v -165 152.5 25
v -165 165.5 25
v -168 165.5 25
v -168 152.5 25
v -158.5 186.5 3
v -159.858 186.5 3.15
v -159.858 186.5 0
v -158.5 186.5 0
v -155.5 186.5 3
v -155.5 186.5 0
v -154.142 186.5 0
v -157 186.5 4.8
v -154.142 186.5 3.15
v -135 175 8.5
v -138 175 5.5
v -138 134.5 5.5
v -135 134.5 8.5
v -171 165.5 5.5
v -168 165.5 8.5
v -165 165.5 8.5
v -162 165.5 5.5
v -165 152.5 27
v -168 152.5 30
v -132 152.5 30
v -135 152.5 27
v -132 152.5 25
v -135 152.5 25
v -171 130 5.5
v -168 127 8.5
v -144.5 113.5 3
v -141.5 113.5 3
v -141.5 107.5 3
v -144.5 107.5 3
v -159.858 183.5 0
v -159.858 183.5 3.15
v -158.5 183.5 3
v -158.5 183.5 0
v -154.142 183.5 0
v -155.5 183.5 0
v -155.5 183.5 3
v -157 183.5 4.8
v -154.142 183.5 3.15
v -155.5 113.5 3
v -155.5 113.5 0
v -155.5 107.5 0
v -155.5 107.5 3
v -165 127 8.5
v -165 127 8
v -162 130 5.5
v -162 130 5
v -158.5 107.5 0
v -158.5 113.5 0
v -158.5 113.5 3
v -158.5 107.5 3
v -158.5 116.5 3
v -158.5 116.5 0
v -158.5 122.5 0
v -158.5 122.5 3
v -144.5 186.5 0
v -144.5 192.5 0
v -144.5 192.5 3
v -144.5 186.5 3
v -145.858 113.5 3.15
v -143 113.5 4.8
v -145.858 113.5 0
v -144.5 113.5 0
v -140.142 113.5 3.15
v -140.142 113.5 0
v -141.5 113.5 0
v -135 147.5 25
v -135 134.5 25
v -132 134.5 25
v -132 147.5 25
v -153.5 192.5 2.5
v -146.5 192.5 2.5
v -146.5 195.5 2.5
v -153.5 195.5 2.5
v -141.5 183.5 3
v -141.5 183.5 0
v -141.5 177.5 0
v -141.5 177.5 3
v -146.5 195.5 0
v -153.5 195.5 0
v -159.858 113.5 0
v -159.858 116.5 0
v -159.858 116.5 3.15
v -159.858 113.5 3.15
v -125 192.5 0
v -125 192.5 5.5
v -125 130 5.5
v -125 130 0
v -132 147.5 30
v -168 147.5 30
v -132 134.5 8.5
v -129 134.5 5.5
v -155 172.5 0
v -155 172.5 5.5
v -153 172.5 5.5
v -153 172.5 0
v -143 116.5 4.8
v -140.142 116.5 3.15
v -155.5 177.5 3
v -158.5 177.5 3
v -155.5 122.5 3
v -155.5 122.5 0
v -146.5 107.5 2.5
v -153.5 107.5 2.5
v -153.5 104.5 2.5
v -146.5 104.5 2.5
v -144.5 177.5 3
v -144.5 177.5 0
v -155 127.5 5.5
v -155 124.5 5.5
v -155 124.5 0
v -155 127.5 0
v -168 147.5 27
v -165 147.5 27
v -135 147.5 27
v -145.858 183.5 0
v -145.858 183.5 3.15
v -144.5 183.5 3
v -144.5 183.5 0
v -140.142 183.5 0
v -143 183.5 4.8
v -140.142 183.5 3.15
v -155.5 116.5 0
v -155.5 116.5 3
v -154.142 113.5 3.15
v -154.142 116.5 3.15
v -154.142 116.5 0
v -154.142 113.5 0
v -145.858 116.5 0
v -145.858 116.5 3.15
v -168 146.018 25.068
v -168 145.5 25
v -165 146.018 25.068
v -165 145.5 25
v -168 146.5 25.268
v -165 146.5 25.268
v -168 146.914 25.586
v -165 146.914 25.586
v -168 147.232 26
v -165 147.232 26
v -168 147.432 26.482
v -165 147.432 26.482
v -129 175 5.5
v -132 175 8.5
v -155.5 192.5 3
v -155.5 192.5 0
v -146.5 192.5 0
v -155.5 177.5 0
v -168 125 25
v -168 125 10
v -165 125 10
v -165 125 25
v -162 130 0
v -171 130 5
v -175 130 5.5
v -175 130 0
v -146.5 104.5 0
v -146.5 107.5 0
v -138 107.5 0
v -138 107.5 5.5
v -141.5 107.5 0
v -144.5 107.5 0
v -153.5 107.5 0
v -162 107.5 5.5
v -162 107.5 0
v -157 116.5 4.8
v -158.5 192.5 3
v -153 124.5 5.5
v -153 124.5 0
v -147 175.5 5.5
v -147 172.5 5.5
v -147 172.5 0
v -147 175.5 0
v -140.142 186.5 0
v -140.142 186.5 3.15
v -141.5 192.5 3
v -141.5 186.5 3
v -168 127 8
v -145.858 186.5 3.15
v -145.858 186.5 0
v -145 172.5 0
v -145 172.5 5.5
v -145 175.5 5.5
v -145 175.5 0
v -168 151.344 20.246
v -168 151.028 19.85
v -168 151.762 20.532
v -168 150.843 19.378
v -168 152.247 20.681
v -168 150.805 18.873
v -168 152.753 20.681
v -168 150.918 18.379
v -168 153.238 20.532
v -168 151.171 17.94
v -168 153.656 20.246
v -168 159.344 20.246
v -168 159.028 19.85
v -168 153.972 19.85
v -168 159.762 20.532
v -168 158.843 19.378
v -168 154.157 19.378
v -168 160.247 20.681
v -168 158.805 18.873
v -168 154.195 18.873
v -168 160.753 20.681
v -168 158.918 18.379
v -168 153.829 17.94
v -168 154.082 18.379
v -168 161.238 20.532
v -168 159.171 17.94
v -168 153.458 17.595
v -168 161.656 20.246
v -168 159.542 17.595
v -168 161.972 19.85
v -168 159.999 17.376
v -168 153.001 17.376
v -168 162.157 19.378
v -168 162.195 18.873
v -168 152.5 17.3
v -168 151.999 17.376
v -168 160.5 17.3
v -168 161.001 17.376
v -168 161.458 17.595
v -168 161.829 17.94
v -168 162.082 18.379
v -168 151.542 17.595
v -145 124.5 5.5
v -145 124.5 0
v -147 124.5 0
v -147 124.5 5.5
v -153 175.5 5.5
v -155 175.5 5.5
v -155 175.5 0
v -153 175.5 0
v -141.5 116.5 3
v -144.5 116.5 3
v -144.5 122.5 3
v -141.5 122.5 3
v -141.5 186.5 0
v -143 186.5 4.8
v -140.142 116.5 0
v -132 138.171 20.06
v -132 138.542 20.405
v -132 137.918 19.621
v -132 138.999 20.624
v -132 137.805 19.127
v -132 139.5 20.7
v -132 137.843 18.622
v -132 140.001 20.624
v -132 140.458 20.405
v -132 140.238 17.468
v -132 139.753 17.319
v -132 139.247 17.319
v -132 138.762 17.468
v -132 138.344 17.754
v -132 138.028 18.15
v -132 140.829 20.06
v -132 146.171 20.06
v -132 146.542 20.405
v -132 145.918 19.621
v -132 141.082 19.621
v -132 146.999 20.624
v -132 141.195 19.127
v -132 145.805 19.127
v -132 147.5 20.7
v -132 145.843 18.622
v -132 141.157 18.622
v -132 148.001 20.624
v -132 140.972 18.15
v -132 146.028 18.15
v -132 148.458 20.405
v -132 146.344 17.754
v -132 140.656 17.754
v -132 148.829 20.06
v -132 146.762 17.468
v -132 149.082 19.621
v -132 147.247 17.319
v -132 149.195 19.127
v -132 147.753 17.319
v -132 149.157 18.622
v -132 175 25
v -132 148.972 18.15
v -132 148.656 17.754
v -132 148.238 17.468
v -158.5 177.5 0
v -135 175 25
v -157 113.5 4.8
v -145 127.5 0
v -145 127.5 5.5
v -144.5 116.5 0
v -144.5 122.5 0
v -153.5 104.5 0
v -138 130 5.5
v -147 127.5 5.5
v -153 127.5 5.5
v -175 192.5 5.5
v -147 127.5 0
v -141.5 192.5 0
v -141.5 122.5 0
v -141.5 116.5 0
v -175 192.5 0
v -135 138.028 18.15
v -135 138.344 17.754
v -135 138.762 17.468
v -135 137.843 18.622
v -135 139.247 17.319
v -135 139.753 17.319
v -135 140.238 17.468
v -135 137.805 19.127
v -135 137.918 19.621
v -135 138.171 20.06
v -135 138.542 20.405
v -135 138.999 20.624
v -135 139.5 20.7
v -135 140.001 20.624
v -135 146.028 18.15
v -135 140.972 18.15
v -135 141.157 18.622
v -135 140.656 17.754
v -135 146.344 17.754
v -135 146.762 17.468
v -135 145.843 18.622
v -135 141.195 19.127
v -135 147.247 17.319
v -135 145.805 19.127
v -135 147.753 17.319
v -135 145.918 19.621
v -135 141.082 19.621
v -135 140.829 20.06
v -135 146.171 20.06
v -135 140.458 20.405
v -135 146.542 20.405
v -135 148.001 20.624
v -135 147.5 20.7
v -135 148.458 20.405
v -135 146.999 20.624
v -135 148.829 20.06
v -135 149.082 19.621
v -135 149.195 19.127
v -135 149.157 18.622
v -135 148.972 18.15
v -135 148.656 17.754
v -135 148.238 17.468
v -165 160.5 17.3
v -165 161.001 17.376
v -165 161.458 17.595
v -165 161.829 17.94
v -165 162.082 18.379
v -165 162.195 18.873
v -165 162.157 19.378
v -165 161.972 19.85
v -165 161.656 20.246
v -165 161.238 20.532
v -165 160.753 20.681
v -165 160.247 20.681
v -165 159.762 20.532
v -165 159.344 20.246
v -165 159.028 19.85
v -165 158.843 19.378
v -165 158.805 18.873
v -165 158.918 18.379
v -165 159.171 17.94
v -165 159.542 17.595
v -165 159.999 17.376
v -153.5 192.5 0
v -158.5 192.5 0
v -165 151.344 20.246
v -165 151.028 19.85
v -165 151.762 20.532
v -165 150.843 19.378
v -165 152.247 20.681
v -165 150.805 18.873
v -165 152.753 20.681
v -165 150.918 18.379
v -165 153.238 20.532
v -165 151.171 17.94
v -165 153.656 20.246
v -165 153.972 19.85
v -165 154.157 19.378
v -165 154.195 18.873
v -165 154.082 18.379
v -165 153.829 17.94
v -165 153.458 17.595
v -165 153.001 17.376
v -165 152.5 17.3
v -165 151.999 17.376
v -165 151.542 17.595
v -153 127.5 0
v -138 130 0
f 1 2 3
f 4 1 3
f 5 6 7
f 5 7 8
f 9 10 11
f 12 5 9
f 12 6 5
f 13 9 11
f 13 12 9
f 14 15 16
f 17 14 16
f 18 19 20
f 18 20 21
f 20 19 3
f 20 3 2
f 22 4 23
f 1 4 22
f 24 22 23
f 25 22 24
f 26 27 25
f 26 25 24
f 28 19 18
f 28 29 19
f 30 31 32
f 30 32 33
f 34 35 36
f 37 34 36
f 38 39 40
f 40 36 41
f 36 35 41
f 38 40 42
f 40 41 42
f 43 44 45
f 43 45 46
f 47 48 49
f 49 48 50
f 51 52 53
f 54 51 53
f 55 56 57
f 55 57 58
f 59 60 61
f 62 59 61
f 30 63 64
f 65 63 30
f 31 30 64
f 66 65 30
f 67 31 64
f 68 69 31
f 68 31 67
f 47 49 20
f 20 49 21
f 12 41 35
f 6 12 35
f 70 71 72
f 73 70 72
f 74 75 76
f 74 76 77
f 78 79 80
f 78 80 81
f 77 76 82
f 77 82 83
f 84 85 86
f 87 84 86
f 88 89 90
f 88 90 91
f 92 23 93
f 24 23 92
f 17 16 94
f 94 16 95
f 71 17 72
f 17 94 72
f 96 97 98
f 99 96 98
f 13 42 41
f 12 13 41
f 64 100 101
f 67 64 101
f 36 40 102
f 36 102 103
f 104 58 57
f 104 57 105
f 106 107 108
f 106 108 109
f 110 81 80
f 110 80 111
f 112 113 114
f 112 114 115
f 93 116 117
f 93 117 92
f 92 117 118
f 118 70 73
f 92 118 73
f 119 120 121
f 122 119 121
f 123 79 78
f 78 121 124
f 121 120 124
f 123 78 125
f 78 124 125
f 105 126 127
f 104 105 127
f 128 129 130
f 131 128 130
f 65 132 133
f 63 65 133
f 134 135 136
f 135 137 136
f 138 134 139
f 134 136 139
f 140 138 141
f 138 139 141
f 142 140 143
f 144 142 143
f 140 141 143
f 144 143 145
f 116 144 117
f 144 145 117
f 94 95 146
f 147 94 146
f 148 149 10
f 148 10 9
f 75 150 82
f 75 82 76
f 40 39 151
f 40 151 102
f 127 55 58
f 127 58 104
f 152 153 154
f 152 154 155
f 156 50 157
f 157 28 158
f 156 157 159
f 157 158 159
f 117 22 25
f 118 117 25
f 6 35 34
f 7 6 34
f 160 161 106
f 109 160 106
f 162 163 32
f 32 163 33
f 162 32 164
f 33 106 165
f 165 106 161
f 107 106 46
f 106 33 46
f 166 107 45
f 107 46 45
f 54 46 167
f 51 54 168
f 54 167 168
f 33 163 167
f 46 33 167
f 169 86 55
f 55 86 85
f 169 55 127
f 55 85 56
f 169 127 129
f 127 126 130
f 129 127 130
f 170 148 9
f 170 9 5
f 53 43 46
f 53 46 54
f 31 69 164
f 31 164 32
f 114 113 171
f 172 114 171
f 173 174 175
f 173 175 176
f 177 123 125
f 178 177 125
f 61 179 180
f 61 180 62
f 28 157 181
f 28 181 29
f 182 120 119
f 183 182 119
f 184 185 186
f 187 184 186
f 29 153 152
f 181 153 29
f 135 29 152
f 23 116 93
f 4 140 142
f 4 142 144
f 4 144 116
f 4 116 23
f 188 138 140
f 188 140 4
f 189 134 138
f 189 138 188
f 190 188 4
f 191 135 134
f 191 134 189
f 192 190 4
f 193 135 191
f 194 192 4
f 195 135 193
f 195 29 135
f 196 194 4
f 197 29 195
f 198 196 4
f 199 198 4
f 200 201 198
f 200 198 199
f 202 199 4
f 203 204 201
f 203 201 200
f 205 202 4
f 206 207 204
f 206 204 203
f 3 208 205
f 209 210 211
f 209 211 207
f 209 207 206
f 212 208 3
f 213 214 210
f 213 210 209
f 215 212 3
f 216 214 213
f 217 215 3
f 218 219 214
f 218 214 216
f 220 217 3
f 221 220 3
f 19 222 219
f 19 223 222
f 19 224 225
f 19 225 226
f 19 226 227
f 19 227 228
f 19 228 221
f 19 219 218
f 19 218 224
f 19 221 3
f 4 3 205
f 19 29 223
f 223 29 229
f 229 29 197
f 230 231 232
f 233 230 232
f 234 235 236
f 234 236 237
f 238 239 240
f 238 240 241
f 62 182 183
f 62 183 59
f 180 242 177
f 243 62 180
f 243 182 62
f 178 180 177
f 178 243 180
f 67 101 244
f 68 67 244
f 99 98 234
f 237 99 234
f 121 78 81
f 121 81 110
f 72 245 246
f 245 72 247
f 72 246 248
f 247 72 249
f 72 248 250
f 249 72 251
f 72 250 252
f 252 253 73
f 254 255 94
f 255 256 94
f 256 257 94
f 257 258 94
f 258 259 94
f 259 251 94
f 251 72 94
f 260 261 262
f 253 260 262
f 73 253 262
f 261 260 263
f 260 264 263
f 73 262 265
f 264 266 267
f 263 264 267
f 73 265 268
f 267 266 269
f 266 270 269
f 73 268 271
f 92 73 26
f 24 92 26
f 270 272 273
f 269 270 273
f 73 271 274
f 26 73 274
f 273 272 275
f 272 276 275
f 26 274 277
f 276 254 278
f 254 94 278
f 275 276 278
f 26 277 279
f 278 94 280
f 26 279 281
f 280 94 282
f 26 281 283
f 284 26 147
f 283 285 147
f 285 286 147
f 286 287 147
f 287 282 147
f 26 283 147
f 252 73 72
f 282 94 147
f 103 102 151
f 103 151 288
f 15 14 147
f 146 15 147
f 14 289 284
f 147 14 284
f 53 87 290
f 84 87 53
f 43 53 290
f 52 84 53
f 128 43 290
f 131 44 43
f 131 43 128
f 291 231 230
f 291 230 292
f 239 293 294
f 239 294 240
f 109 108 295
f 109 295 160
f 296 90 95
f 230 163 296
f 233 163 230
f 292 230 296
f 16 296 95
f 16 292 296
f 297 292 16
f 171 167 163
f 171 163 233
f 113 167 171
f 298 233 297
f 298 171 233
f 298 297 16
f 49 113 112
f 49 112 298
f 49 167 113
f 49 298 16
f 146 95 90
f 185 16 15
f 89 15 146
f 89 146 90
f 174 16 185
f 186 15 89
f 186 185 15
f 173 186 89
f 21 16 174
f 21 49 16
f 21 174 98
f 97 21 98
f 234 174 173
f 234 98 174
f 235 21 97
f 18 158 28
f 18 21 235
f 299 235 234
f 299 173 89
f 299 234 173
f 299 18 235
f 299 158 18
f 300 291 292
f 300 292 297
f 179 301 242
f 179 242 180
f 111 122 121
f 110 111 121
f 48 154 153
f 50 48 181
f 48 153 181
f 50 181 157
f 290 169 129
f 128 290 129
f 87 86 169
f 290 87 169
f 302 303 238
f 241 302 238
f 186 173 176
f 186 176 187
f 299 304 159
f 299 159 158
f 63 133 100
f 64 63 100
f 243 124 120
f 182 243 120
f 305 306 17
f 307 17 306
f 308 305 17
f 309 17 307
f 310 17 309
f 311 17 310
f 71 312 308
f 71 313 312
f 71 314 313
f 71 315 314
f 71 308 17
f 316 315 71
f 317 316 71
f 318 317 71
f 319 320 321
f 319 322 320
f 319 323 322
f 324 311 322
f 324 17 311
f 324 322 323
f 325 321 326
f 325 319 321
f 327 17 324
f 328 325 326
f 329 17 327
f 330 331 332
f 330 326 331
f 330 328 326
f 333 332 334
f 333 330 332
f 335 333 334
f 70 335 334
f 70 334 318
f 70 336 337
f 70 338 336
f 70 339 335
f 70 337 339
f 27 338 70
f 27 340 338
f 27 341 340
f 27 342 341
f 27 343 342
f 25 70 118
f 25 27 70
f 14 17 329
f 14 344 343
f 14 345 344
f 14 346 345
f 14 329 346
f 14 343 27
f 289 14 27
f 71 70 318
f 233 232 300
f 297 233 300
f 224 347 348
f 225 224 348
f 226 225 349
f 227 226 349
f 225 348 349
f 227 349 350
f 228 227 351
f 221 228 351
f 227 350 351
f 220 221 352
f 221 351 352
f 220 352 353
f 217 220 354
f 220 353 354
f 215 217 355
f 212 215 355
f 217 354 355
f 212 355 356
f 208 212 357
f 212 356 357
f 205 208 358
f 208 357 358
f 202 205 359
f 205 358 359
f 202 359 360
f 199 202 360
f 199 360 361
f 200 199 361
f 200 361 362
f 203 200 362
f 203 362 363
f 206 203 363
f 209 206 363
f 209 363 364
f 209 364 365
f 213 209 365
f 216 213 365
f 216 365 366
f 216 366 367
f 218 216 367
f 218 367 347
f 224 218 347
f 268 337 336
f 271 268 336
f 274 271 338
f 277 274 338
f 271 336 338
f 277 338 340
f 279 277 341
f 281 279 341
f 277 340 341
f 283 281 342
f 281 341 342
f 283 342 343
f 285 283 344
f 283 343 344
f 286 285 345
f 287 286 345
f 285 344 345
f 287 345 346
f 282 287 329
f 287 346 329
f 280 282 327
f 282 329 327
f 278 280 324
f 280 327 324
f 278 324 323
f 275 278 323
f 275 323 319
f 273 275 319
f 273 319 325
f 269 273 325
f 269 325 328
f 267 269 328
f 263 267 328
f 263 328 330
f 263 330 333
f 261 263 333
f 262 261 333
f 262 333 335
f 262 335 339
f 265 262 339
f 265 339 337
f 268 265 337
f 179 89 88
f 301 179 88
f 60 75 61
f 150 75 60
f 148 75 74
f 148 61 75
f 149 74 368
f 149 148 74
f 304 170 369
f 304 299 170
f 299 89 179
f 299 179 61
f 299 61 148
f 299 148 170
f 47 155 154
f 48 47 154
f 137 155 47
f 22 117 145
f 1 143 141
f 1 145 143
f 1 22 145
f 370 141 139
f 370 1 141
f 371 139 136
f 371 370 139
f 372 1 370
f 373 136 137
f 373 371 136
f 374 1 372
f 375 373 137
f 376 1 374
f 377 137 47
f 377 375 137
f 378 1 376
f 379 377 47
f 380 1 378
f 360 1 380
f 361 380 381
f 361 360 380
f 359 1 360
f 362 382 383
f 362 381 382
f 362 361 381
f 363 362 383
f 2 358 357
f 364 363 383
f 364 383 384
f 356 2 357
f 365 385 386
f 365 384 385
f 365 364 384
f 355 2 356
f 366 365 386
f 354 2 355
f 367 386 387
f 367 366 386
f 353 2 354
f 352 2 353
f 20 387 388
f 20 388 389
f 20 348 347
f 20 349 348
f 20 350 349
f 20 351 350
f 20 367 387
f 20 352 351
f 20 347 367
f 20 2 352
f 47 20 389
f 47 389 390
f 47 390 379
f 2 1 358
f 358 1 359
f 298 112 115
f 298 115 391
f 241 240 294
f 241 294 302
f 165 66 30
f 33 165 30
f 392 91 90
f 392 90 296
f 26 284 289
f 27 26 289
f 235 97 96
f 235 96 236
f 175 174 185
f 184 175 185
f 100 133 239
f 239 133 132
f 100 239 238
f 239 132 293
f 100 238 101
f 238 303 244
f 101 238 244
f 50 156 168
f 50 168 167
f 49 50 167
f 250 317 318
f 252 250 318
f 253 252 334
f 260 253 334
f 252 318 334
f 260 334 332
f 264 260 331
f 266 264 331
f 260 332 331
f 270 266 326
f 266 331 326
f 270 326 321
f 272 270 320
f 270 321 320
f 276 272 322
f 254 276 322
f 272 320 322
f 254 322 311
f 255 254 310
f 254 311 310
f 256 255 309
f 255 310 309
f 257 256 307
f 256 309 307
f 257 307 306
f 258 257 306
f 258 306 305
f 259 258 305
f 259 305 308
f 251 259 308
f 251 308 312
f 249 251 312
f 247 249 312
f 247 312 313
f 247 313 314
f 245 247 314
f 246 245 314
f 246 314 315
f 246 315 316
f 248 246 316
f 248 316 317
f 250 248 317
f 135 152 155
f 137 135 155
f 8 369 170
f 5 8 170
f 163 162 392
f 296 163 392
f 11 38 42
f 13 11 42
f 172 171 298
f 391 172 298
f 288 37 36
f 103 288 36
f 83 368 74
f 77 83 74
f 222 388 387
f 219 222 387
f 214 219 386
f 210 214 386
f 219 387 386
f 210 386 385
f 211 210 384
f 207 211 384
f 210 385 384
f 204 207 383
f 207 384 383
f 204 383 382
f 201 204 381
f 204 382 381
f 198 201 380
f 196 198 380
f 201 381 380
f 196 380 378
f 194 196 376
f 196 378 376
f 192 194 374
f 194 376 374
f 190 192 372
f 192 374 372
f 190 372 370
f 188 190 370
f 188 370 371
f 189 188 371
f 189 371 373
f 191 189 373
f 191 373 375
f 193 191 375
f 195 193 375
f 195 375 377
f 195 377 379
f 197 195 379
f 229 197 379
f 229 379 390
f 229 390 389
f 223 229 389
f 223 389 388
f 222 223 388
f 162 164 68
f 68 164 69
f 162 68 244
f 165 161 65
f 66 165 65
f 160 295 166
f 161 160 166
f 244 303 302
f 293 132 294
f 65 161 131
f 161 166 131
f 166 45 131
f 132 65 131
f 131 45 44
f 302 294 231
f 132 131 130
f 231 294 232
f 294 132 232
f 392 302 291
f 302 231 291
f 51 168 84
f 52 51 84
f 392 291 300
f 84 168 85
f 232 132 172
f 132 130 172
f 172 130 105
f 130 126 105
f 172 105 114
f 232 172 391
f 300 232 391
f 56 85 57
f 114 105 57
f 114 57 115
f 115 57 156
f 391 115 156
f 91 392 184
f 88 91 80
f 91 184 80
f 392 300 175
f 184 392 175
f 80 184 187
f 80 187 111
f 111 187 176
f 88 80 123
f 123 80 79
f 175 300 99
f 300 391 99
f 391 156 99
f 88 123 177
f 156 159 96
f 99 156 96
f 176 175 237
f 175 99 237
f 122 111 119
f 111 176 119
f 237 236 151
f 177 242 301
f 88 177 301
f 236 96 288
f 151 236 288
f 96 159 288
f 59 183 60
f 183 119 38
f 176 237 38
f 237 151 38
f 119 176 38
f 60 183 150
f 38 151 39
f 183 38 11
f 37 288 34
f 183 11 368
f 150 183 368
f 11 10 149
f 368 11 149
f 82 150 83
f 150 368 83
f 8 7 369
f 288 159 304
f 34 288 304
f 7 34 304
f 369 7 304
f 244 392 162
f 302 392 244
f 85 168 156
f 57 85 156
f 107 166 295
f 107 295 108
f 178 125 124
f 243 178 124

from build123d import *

# Parameters (mm, degrees)
CUT_EXTRUDE_START           = -3
CUT_EXTRUDE_1_DEPTH         = 0.5
CUT_EXTRUDE_START_2         = 127
CUT_EXTRUDE_1_2_DEPTH       = 3
CUT_EXTRUDE_START_3         = -172
CUT_EXTRUDE_1_3_DEPTH       = 8
SKETCH_2_W                  = 2.5
SKETCH_2_H                  = 0.5
EXTRUDE_1_DEPTH             = 0.5
SKETCH_3_W                  = 2.5
SKETCH_3_H                  = 0.5
EXTRUDE_2_DEPTH             = 5
EXTRUDE_3_DEPTH             = 0.5
EXTRUDE_4_DEPTH             = 36
EXTRUDE_5_DEPTH             = 35.5
EXTRUDE_6_DEPTH             = 9.5
SKETCH_8_W                  = 39
SKETCH_8_H                  = 5.5
EXTRUDE_7_DEPTH             = 17.5
SKETCH_9_W                  = 36
SKETCH_9_H                  = 2
CUT_EXTRUDE_2_DEPTH         = 22.5
SKETCH_10_W                 = 36
SKETCH_10_H                 = 2
CUT_EXTRUDE_3_DEPTH         = 22.5
SKETCH_11_W                 = 39
SKETCH_11_H                 = 5.5
EXTRUDE_8_DEPTH             = 22
SKETCH_12_W                 = 5.5
SKETCH_12_H                 = 62.5
EXTRUDE_9_DEPTH             = 4
CUT_EXTRUDE_4_DEPTH         = 9
SKETCH_14_W                 = 5.5
SKETCH_14_H                 = 85
EXTRUDE_10_DEPTH            = 7
CUT_EXTRUDE_5_DEPTH         = 30
SKETCH_16_W                 = 19.5
SKETCH_16_H                 = 9.5
CUT_EXTRUDE_6_DEPTH         = 6
CUT_EXTRUDE_7_DEPTH         = 27
CUT_EXTRUDE_8_DEPTH         = 3
SKETCH_19_W                 = 36
SKETCH_19_H                 = 5
EXTRUDE_11_DEPTH            = 3
CUT_EXTRUDE_9_DEPTH         = 3
SKETCH_21_W                 = 3
SKETCH_21_H                 = 3
CUT_EXTRUDE_10_DEPTH        = 195.334762716
CUT_EXTRUDE_11_DEPTH        = 3
SKETCH_23_W                 = 3
SKETCH_23_H                 = 3
CUT_EXTRUDE_12_DEPTH        = 195.334762716
CUT_EXTRUDE_13_DEPTH        = 3
CUT_EXTRUDE_14_REACH        = 198.85
SKETCH_25_W                 = 3
SKETCH_25_H                 = 3
CUT_EXTRUDE_15_DEPTH        = 3
CUT_EXTRUDE_16_REACH        = 198.85
SKETCH_27_W                 = 3
SKETCH_27_H                 = 3
SKETCH_28_W                 = 13
SKETCH_28_H                 = 22.5
CUT_EXTRUDE_17_DEPTH        = 262.880220712
SKETCH_29_W                 = 2
SKETCH_29_H                 = 3
CUT_EXTRUDE_18_DEPTH        = 262.307290369
SKETCH_30_W                 = 2
SKETCH_30_H                 = 3
CUT_EXTRUDE_19_DEPTH        = 262.307290369
SKETCH_31_W                 = 2
SKETCH_31_H                 = 3
CUT_EXTRUDE_20_DEPTH        = 262.307290369
SKETCH_32_W                 = 2
SKETCH_32_H                 = 3
CUT_EXTRUDE_21_DEPTH        = 262.880220712
SKETCH_33_W                 = 7
SKETCH_33_H                 = 2.5
EXTRUDE_12_DEPTH            = 3
SKETCH_34_W                 = 7
SKETCH_34_H                 = 2.5
EXTRUDE_13_DEPTH            = 3
SKETCH_35_W                 = 3
SKETCH_35_H                 = 3
CUT_EXTRUDE_22_DEPTH        = 6
SKETCH_36_W                 = 3
SKETCH_36_H                 = 3
CUT_EXTRUDE_23_DEPTH        = 6
SKETCH_37_W                 = 3
SKETCH_37_H                 = 3
CUT_EXTRUDE_24_DEPTH        = 6
SKETCH_38_W                 = 3
SKETCH_38_H                 = 3
CUT_EXTRUDE_25_DEPTH        = 6
HOLE_WIZARD_3_4_3_4_1_D     = 3.4
HOLE_WIZARD_3_4_3_4_1_DEPTH = 3
HOLE_WIZARD_3_4_3_4_2_D     = 3.4
HOLE_WIZARD_3_4_3_4_2_DEPTH = 3
CHAMFER_1_SIZE              = 3
CHAMFER_2_SIZE              = 0.40824829
FILLET_2_R                  = 2


with BuildPart() as part:
    # 切除-拉伸1: read off the stored shape, not the designer's step
    # 切除-拉伸1 outline → 切除-拉伸1 (new body)
    with BuildSketch(Plane(origin=(-168, 0, 0), x_dir=(0, 0, -1), z_dir=(1, 0, 0)).offset(CUT_EXTRUDE_START)):
        Polygon((-5, 130), (-5.5, 130), (-5.5, 129.5), align=None)
    extrude(amount=CUT_EXTRUDE_1_DEPTH)

    # Cut-Extrude 1 2 outline → Cut-Extrude 1 2 (add)
    with BuildSketch(Plane(origin=(0, 0, 0), x_dir=(1, 0, 0), z_dir=(0, 1, 0)).offset(CUT_EXTRUDE_START_2)):
        Polygon((-171, -5.5), (-168, -8.5), (-168, -5.5), align=None)
    extrude(amount=CUT_EXTRUDE_1_2_DEPTH)

    # Cut-Extrude 1 3 outline → Cut-Extrude 1 3 (cut)
    with BuildSketch(Plane(origin=(0, 0, 0), x_dir=(0.8164965809277257, 0.4082482904638635, -0.4082482904638629), z_dir=(0.5773502691896261, -0.5773502691896261, 0.5773502691896253)).offset(CUT_EXTRUDE_START_3)):
        Polygon((-85, 95.45941546), (-88.589879031, 95.45941546), (-88.794003176, 95.812968851), (-90.018748047, 93.691648507), (-90.995421768, 92), (-85, 92), align=None)
    extrude(amount=CUT_EXTRUDE_1_3_DEPTH, mode=Mode.SUBTRACT)

    # 草图2 → 凸台-拉伸1 (add)
    with BuildSketch(Plane(origin=(0, 0, 5.5), x_dir=(-1, 0, 0), z_dir=(0, 0, -1))):
        with Locations((169.25, 129.75)):
            Rectangle(SKETCH_2_W, SKETCH_2_H)
    extrude(amount=EXTRUDE_1_DEPTH)

    # 草图3 → 凸台-拉伸2 (add)
    with BuildSketch(Plane(origin=(0, 0, 5), x_dir=(-1, 0, 0), z_dir=(0, 0, -1))):
        with Locations((169.25, 129.75)):
            Rectangle(SKETCH_3_W, SKETCH_3_H)
    extrude(amount=EXTRUDE_2_DEPTH)

    # 草图4 → 凸台-拉伸3 (add)
    with BuildSketch(Plane.ZY.offset(170.5)):
        Polygon((0, 130), (5, 130), (5.5, 129.5), (0, 129.5), align=None)
    extrude(amount=EXTRUDE_3_DEPTH)

    # 草图5 → 凸台-拉伸4 (add)
    with BuildSketch(Plane(origin=(-168, 0, 0), x_dir=(0, 0, -1), z_dir=(1, 0, 0))):
        Polygon((0, 130), (0, 129.5), (-5.5, 129.5), (-10, 125), (-27, 125), (-27, 130), align=None)
    extrude(amount=EXTRUDE_4_DEPTH)

    # 草图6 → 凸台-拉伸5 (add)
    with BuildSketch(Plane(origin=(0, 130, 0), x_dir=(-1, 0, 0), z_dir=(0, 1, 0))):
        Polygon((168, 8.5), (171, 5.5), (171, 0), (132, 0), (132, 27), (168, 27), align=None)
    extrude(amount=EXTRUDE_5_DEPTH)

    # 草图7 → 凸台-拉伸6 (add)
    with BuildSketch(Plane(origin=(0, 165.5, 0), x_dir=(-1, 0, 0), z_dir=(0, 1, 0))):
        Polygon((132, 0), (132, 27), (168, 27), (168, 5.5), (171, 5.5), (171, 0), align=None)
    extrude(amount=EXTRUDE_6_DEPTH)

    # 草图8 → 凸台-拉伸7 (add)
    with BuildSketch(Plane(origin=(0, 175, 0), x_dir=(-1, 0, 0), z_dir=(0, 1, 0))):
        with Locations((151.5, 2.75)):
            Rectangle(SKETCH_8_W, SKETCH_8_H)
    extrude(amount=EXTRUDE_7_DEPTH)

    # 草图9 → 切除-拉伸2 (cut)
    with BuildSketch(Plane.XZ.offset(-125)):
        with Locations((-150, 26)):
            Rectangle(SKETCH_9_W, SKETCH_9_H)
    extrude(amount=-CUT_EXTRUDE_2_DEPTH, mode=Mode.SUBTRACT)

    # 草图10 → 切除-拉伸3 (cut)
    with BuildSketch(Plane(origin=(0, 175, 0), x_dir=(-1, 0, 0), z_dir=(0, 1, 0))):
        with Locations((150, 26)):
            Rectangle(SKETCH_10_W, SKETCH_10_H)
    extrude(amount=-CUT_EXTRUDE_3_DEPTH, mode=Mode.SUBTRACT)

    # 草图11 → 凸台-拉伸8 (add)
    with BuildSketch(Plane.XZ.offset(-129.5)):
        with Locations((-151.5, 2.75)):
            Rectangle(SKETCH_11_W, SKETCH_11_H)
    extrude(amount=EXTRUDE_8_DEPTH)

    # 草图12 → 凸台-拉伸9 (add)
    with BuildSketch(Plane.ZY.offset(171)):
        with Locations((2.75, 161.25)):
            Rectangle(SKETCH_12_W, SKETCH_12_H)
    extrude(amount=EXTRUDE_9_DEPTH)

    # 草图13 → 切除-拉伸4 (cut)
    with BuildSketch(Plane.ZY.offset(171)):
        Polygon((0, 130), (0, 107.5), (5.5, 107.5), (5.5, 129.5), (5, 130), align=None)
    extrude(amount=-CUT_EXTRUDE_4_DEPTH, mode=Mode.SUBTRACT)

    # 草图14 → 凸台-拉伸10 (add)
    with BuildSketch(Plane(origin=(-132, 0, 0), x_dir=(0, 0, -1), z_dir=(1, 0, 0))):
        with Locations((-2.75, 150)):
            Rectangle(SKETCH_14_W, SKETCH_14_H)
    extrude(amount=EXTRUDE_10_DEPTH)

    # 草图15 → 切除-拉伸5 (cut)
    with BuildSketch(Plane(origin=(-132, 0, 0), x_dir=(0, 0, -1), z_dir=(1, 0, 0))):
        Polygon((-5.5, 134.5), (-25, 134.5), (-25, 125), (-10, 125), (-5.5, 129.5), align=None)
    extrude(amount=-CUT_EXTRUDE_5_DEPTH, mode=Mode.SUBTRACT)

    # 草图16 → 切除-拉伸6 (cut)
    with BuildSketch(Plane.ZY.offset(168)):
        with Locations((15.25, 170.25)):
            Rectangle(SKETCH_16_W, SKETCH_16_H)
    extrude(amount=-CUT_EXTRUDE_6_DEPTH, mode=Mode.SUBTRACT)

    # 草图17 → 切除-拉伸7 (cut)
    with BuildSketch(Plane.ZY.offset(162)):
        Polygon((25, 134.5), (25, 147.5), (27, 147.5), (27, 152.5), (25, 152.5), (25, 175), (5.5, 175), (5.5, 134.5), align=None)
    extrude(amount=-CUT_EXTRUDE_7_DEPTH, mode=Mode.SUBTRACT)

    # 草图18 → 切除-拉伸8 (cut)
    with BuildSketch(Plane(origin=(-162, 0, 0), x_dir=(0, 0, -1), z_dir=(1, 0, 0))):
        Polygon((-10, 125), (-5.5, 129.5), (-5.5, 165.5), (-25, 165.5), (-25, 152.5), (-27, 152.5), (-27, 147.5), (-25, 147.5), (-25, 125), align=None)
    extrude(amount=-CUT_EXTRUDE_8_DEPTH, mode=Mode.SUBTRACT)

    # 草图19 → 凸台-拉伸11 (add)
    with BuildSketch(Plane.XY.offset(27)):
        with Locations((-150, 150)):
            Rectangle(SKETCH_19_W, SKETCH_19_H)
    extrude(amount=EXTRUDE_11_DEPTH)

    # 草图20 → 切除-拉伸9 (cut)
    with BuildSketch(Plane(origin=(0, 116.5, 0), x_dir=(1, 0, 0), z_dir=(0, 1, 0))):
        Polygon((-145.857883832, 0), (-145.857883832, -3.15), (-143, -4.8), (-140.142116168, -3.15), (-140.142116168, 0), align=None)
    extrude(amount=-CUT_EXTRUDE_9_DEPTH, mode=Mode.SUBTRACT)

    # 草图21 → 切除-拉伸10 (cut, through all)
    with BuildSketch(Plane(origin=(0, 113.5, 0), x_dir=(-1, 0, 0), z_dir=(0, 1, 0))):
        with Locations((143, 1.5)):
            Rectangle(SKETCH_21_W, SKETCH_21_H)
    extrude(amount=-CUT_EXTRUDE_10_DEPTH, mode=Mode.SUBTRACT)

    # 草图22 → 切除-拉伸11 (cut)
    with BuildSketch(Plane(origin=(0, 116.5, 0), x_dir=(1, 0, 0), z_dir=(0, 1, 0))):
        Polygon((-159.857883832, 0), (-159.857883832, -3.15), (-157, -4.8), (-154.142116168, -3.15), (-154.142116168, 0), align=None)
    extrude(amount=-CUT_EXTRUDE_11_DEPTH, mode=Mode.SUBTRACT)

    # 草图23 → 切除-拉伸12 (cut, through all)
    with BuildSketch(Plane(origin=(0, 113.5, 0), x_dir=(-1, 0, 0), z_dir=(0, 1, 0))):
        with Locations((157, 1.5)):
            Rectangle(SKETCH_23_W, SKETCH_23_H)
    extrude(amount=-CUT_EXTRUDE_12_DEPTH, mode=Mode.SUBTRACT)

    # 草图24 → 切除-拉伸13 (cut)
    with BuildSketch(Plane.XZ.offset(-183.5)):
        Polygon((-145.857883832, 0), (-140.142116168, 0), (-140.142116168, 3.15), (-143, 4.8), (-145.857883832, 3.15), align=None)
    extrude(amount=-CUT_EXTRUDE_13_DEPTH, mode=Mode.SUBTRACT)

    # 草图25 → 切除-拉伸14 (cut, up to next)
    with BuildSketch(Plane(origin=(0, 192.5, 0), x_dir=(-1, 0, 0), z_dir=(0, 1, 0)), mode=Mode.PRIVATE) as cut_extrude_14_sk1:
        with Locations((143, 1.5)):
            Rectangle(SKETCH_25_W, SKETCH_25_H)
    cut_extrude_14_tool1 = extrude(cut_extrude_14_sk1.sketch, amount=-CUT_EXTRUDE_14_REACH, mode=Mode.PRIVATE) & part.part
    add(cut_extrude_14_tool1.solids().sort_by_distance((-143, 192.5, 1.5))[0], mode=Mode.SUBTRACT)

    # 草图26 → 切除-拉伸15 (cut)
    with BuildSketch(Plane.XZ.offset(-183.5)):
        Polygon((-159.857883832, 0), (-154.142116168, 0), (-154.142116168, 3.15), (-157, 4.8), (-159.857883832, 3.15), align=None)
    extrude(amount=-CUT_EXTRUDE_15_DEPTH, mode=Mode.SUBTRACT)

    # 草图27 → 切除-拉伸16 (cut, up to next)
    with BuildSketch(Plane(origin=(0, 192.5, 0), x_dir=(-1, 0, 0), z_dir=(0, 1, 0)), mode=Mode.PRIVATE) as cut_extrude_16_sk1:
        with Locations((157, 1.5)):
            Rectangle(SKETCH_27_W, SKETCH_27_H)
    cut_extrude_16_tool1 = extrude(cut_extrude_16_sk1.sketch, amount=-CUT_EXTRUDE_16_REACH, mode=Mode.PRIVATE) & part.part
    add(cut_extrude_16_tool1.solids().sort_by_distance((-157, 192.5, 1.5))[0], mode=Mode.SUBTRACT)

    # 草图28 → 切除-拉伸17 (cut, through all)
    with BuildSketch(Plane(origin=(0, 0, 0), x_dir=(-1, 0, 0), z_dir=(0, 0, -1))):
        with Locations((131.5, 118.75)):
            Rectangle(SKETCH_28_W, SKETCH_28_H)
    extrude(amount=-CUT_EXTRUDE_17_DEPTH, mode=Mode.SUBTRACT)

    # 草图29 → 切除-拉伸18 (cut, through all)
    with BuildSketch(Plane.XY.offset(5.5)):
        with Locations((-154, 174)):
            Rectangle(SKETCH_29_W, SKETCH_29_H)
    extrude(amount=-CUT_EXTRUDE_18_DEPTH, mode=Mode.SUBTRACT)

    # 草图30 → 切除-拉伸19 (cut, through all)
    with BuildSketch(Plane.XY.offset(5.5)):
        with Locations((-146, 174)):
            Rectangle(SKETCH_30_W, SKETCH_30_H)
    extrude(amount=-CUT_EXTRUDE_19_DEPTH, mode=Mode.SUBTRACT)

    # 草图31 → 切除-拉伸20 (cut, through all)
    with BuildSketch(Plane.XY.offset(5.5)):
        with Locations((-154, 126)):
            Rectangle(SKETCH_31_W, SKETCH_31_H)
    extrude(amount=-CUT_EXTRUDE_20_DEPTH, mode=Mode.SUBTRACT)

    # 草图32 → 切除-拉伸21 (cut, through all)
    with BuildSketch(Plane(origin=(0, 0, 0), x_dir=(-1, 0, 0), z_dir=(0, 0, -1))):
        with Locations((146, 126)):
            Rectangle(SKETCH_32_W, SKETCH_32_H)
    extrude(amount=-CUT_EXTRUDE_21_DEPTH, mode=Mode.SUBTRACT)

    # 草图33 → 凸台-拉伸12 (add)
    with BuildSketch(Plane.XZ.offset(-107.5)):
        with Locations((-150, 1.25)):
            Rectangle(SKETCH_33_W, SKETCH_33_H)
    extrude(amount=EXTRUDE_12_DEPTH)

    # 草图34 → 凸台-拉伸13 (add)
    with BuildSketch(Plane(origin=(0, 192.5, 0), x_dir=(-1, 0, 0), z_dir=(0, 1, 0))):
        with Locations((150, 1.25)):
            Rectangle(SKETCH_34_W, SKETCH_34_H)
    extrude(amount=EXTRUDE_13_DEPTH)

    # 草图35 → 切除-拉伸22 (cut)
    with BuildSketch(Plane.XZ.offset(-116.5)):
        with Locations((-143, 1.5)):
            Rectangle(SKETCH_35_W, SKETCH_35_H)
    extrude(amount=-CUT_EXTRUDE_22_DEPTH, mode=Mode.SUBTRACT)

    # 草图36 → 切除-拉伸23 (cut)
    with BuildSketch(Plane.XZ.offset(-116.5)):
        with Locations((-157, 1.5)):
            Rectangle(SKETCH_36_W, SKETCH_36_H)
    extrude(amount=-CUT_EXTRUDE_23_DEPTH, mode=Mode.SUBTRACT)

    # 草图37 → 切除-拉伸24 (cut)
    with BuildSketch(Plane(origin=(0, 183.5, 0), x_dir=(-1, 0, 0), z_dir=(0, 1, 0))):
        with Locations((143, 1.5)):
            Rectangle(SKETCH_37_W, SKETCH_37_H)
    extrude(amount=-CUT_EXTRUDE_24_DEPTH, mode=Mode.SUBTRACT)

    # 草图38 → 切除-拉伸25 (cut)
    with BuildSketch(Plane(origin=(0, 183.5, 0), x_dir=(-1, 0, 0), z_dir=(0, 1, 0))):
        with Locations((157, 1.5)):
            Rectangle(SKETCH_38_W, SKETCH_38_H)
    extrude(amount=-CUT_EXTRUDE_25_DEPTH, mode=Mode.SUBTRACT)

    # Ø3.4 (3.4) 直径孔1
    with Locations(Plane.ZY.offset(168)):
        with Locations((19, 152.5), (19, 160.5)):
            Hole(HOLE_WIZARD_3_4_3_4_1_D / 2, depth=HOLE_WIZARD_3_4_3_4_1_DEPTH)

    # Ø3.4 (3.4) 直径孔2
    with Locations(Plane(origin=(-132, 0, 0), x_dir=(0, 0, -1), z_dir=(1, 0, 0))):
        with Locations((-19, 147.5), (-19, 139.5)):
            Hole(HOLE_WIZARD_3_4_3_4_2_D / 2, depth=HOLE_WIZARD_3_4_3_4_2_DEPTH)

    # 倒角1
    chamfer_1_edges = [part.edges().sort_by_distance(p)[0] for p in [
        (-135, 154.75, 5.5),
        (-132, 154.75, 5.5),
        (-165, 147.5, 5.5),
    ]]
    chamfer(chamfer_1_edges, length=CHAMFER_1_SIZE)

    # 倒角2
    chamfer_2_edges = [part.edges().sort_by_distance(p)[0] for p in [
        (-163.5, 128, 7),
    ]]
    chamfer(chamfer_2_edges, length=CHAMFER_2_SIZE)

    # 圆角2
    fillet_2_edges = [part.edges().sort_by_distance(p)[0] for p in [
        (-166.5, 147.5, 25),
    ]]
    fillet(fillet_2_edges, radius=FILLET_2_R)


solid = part.part
